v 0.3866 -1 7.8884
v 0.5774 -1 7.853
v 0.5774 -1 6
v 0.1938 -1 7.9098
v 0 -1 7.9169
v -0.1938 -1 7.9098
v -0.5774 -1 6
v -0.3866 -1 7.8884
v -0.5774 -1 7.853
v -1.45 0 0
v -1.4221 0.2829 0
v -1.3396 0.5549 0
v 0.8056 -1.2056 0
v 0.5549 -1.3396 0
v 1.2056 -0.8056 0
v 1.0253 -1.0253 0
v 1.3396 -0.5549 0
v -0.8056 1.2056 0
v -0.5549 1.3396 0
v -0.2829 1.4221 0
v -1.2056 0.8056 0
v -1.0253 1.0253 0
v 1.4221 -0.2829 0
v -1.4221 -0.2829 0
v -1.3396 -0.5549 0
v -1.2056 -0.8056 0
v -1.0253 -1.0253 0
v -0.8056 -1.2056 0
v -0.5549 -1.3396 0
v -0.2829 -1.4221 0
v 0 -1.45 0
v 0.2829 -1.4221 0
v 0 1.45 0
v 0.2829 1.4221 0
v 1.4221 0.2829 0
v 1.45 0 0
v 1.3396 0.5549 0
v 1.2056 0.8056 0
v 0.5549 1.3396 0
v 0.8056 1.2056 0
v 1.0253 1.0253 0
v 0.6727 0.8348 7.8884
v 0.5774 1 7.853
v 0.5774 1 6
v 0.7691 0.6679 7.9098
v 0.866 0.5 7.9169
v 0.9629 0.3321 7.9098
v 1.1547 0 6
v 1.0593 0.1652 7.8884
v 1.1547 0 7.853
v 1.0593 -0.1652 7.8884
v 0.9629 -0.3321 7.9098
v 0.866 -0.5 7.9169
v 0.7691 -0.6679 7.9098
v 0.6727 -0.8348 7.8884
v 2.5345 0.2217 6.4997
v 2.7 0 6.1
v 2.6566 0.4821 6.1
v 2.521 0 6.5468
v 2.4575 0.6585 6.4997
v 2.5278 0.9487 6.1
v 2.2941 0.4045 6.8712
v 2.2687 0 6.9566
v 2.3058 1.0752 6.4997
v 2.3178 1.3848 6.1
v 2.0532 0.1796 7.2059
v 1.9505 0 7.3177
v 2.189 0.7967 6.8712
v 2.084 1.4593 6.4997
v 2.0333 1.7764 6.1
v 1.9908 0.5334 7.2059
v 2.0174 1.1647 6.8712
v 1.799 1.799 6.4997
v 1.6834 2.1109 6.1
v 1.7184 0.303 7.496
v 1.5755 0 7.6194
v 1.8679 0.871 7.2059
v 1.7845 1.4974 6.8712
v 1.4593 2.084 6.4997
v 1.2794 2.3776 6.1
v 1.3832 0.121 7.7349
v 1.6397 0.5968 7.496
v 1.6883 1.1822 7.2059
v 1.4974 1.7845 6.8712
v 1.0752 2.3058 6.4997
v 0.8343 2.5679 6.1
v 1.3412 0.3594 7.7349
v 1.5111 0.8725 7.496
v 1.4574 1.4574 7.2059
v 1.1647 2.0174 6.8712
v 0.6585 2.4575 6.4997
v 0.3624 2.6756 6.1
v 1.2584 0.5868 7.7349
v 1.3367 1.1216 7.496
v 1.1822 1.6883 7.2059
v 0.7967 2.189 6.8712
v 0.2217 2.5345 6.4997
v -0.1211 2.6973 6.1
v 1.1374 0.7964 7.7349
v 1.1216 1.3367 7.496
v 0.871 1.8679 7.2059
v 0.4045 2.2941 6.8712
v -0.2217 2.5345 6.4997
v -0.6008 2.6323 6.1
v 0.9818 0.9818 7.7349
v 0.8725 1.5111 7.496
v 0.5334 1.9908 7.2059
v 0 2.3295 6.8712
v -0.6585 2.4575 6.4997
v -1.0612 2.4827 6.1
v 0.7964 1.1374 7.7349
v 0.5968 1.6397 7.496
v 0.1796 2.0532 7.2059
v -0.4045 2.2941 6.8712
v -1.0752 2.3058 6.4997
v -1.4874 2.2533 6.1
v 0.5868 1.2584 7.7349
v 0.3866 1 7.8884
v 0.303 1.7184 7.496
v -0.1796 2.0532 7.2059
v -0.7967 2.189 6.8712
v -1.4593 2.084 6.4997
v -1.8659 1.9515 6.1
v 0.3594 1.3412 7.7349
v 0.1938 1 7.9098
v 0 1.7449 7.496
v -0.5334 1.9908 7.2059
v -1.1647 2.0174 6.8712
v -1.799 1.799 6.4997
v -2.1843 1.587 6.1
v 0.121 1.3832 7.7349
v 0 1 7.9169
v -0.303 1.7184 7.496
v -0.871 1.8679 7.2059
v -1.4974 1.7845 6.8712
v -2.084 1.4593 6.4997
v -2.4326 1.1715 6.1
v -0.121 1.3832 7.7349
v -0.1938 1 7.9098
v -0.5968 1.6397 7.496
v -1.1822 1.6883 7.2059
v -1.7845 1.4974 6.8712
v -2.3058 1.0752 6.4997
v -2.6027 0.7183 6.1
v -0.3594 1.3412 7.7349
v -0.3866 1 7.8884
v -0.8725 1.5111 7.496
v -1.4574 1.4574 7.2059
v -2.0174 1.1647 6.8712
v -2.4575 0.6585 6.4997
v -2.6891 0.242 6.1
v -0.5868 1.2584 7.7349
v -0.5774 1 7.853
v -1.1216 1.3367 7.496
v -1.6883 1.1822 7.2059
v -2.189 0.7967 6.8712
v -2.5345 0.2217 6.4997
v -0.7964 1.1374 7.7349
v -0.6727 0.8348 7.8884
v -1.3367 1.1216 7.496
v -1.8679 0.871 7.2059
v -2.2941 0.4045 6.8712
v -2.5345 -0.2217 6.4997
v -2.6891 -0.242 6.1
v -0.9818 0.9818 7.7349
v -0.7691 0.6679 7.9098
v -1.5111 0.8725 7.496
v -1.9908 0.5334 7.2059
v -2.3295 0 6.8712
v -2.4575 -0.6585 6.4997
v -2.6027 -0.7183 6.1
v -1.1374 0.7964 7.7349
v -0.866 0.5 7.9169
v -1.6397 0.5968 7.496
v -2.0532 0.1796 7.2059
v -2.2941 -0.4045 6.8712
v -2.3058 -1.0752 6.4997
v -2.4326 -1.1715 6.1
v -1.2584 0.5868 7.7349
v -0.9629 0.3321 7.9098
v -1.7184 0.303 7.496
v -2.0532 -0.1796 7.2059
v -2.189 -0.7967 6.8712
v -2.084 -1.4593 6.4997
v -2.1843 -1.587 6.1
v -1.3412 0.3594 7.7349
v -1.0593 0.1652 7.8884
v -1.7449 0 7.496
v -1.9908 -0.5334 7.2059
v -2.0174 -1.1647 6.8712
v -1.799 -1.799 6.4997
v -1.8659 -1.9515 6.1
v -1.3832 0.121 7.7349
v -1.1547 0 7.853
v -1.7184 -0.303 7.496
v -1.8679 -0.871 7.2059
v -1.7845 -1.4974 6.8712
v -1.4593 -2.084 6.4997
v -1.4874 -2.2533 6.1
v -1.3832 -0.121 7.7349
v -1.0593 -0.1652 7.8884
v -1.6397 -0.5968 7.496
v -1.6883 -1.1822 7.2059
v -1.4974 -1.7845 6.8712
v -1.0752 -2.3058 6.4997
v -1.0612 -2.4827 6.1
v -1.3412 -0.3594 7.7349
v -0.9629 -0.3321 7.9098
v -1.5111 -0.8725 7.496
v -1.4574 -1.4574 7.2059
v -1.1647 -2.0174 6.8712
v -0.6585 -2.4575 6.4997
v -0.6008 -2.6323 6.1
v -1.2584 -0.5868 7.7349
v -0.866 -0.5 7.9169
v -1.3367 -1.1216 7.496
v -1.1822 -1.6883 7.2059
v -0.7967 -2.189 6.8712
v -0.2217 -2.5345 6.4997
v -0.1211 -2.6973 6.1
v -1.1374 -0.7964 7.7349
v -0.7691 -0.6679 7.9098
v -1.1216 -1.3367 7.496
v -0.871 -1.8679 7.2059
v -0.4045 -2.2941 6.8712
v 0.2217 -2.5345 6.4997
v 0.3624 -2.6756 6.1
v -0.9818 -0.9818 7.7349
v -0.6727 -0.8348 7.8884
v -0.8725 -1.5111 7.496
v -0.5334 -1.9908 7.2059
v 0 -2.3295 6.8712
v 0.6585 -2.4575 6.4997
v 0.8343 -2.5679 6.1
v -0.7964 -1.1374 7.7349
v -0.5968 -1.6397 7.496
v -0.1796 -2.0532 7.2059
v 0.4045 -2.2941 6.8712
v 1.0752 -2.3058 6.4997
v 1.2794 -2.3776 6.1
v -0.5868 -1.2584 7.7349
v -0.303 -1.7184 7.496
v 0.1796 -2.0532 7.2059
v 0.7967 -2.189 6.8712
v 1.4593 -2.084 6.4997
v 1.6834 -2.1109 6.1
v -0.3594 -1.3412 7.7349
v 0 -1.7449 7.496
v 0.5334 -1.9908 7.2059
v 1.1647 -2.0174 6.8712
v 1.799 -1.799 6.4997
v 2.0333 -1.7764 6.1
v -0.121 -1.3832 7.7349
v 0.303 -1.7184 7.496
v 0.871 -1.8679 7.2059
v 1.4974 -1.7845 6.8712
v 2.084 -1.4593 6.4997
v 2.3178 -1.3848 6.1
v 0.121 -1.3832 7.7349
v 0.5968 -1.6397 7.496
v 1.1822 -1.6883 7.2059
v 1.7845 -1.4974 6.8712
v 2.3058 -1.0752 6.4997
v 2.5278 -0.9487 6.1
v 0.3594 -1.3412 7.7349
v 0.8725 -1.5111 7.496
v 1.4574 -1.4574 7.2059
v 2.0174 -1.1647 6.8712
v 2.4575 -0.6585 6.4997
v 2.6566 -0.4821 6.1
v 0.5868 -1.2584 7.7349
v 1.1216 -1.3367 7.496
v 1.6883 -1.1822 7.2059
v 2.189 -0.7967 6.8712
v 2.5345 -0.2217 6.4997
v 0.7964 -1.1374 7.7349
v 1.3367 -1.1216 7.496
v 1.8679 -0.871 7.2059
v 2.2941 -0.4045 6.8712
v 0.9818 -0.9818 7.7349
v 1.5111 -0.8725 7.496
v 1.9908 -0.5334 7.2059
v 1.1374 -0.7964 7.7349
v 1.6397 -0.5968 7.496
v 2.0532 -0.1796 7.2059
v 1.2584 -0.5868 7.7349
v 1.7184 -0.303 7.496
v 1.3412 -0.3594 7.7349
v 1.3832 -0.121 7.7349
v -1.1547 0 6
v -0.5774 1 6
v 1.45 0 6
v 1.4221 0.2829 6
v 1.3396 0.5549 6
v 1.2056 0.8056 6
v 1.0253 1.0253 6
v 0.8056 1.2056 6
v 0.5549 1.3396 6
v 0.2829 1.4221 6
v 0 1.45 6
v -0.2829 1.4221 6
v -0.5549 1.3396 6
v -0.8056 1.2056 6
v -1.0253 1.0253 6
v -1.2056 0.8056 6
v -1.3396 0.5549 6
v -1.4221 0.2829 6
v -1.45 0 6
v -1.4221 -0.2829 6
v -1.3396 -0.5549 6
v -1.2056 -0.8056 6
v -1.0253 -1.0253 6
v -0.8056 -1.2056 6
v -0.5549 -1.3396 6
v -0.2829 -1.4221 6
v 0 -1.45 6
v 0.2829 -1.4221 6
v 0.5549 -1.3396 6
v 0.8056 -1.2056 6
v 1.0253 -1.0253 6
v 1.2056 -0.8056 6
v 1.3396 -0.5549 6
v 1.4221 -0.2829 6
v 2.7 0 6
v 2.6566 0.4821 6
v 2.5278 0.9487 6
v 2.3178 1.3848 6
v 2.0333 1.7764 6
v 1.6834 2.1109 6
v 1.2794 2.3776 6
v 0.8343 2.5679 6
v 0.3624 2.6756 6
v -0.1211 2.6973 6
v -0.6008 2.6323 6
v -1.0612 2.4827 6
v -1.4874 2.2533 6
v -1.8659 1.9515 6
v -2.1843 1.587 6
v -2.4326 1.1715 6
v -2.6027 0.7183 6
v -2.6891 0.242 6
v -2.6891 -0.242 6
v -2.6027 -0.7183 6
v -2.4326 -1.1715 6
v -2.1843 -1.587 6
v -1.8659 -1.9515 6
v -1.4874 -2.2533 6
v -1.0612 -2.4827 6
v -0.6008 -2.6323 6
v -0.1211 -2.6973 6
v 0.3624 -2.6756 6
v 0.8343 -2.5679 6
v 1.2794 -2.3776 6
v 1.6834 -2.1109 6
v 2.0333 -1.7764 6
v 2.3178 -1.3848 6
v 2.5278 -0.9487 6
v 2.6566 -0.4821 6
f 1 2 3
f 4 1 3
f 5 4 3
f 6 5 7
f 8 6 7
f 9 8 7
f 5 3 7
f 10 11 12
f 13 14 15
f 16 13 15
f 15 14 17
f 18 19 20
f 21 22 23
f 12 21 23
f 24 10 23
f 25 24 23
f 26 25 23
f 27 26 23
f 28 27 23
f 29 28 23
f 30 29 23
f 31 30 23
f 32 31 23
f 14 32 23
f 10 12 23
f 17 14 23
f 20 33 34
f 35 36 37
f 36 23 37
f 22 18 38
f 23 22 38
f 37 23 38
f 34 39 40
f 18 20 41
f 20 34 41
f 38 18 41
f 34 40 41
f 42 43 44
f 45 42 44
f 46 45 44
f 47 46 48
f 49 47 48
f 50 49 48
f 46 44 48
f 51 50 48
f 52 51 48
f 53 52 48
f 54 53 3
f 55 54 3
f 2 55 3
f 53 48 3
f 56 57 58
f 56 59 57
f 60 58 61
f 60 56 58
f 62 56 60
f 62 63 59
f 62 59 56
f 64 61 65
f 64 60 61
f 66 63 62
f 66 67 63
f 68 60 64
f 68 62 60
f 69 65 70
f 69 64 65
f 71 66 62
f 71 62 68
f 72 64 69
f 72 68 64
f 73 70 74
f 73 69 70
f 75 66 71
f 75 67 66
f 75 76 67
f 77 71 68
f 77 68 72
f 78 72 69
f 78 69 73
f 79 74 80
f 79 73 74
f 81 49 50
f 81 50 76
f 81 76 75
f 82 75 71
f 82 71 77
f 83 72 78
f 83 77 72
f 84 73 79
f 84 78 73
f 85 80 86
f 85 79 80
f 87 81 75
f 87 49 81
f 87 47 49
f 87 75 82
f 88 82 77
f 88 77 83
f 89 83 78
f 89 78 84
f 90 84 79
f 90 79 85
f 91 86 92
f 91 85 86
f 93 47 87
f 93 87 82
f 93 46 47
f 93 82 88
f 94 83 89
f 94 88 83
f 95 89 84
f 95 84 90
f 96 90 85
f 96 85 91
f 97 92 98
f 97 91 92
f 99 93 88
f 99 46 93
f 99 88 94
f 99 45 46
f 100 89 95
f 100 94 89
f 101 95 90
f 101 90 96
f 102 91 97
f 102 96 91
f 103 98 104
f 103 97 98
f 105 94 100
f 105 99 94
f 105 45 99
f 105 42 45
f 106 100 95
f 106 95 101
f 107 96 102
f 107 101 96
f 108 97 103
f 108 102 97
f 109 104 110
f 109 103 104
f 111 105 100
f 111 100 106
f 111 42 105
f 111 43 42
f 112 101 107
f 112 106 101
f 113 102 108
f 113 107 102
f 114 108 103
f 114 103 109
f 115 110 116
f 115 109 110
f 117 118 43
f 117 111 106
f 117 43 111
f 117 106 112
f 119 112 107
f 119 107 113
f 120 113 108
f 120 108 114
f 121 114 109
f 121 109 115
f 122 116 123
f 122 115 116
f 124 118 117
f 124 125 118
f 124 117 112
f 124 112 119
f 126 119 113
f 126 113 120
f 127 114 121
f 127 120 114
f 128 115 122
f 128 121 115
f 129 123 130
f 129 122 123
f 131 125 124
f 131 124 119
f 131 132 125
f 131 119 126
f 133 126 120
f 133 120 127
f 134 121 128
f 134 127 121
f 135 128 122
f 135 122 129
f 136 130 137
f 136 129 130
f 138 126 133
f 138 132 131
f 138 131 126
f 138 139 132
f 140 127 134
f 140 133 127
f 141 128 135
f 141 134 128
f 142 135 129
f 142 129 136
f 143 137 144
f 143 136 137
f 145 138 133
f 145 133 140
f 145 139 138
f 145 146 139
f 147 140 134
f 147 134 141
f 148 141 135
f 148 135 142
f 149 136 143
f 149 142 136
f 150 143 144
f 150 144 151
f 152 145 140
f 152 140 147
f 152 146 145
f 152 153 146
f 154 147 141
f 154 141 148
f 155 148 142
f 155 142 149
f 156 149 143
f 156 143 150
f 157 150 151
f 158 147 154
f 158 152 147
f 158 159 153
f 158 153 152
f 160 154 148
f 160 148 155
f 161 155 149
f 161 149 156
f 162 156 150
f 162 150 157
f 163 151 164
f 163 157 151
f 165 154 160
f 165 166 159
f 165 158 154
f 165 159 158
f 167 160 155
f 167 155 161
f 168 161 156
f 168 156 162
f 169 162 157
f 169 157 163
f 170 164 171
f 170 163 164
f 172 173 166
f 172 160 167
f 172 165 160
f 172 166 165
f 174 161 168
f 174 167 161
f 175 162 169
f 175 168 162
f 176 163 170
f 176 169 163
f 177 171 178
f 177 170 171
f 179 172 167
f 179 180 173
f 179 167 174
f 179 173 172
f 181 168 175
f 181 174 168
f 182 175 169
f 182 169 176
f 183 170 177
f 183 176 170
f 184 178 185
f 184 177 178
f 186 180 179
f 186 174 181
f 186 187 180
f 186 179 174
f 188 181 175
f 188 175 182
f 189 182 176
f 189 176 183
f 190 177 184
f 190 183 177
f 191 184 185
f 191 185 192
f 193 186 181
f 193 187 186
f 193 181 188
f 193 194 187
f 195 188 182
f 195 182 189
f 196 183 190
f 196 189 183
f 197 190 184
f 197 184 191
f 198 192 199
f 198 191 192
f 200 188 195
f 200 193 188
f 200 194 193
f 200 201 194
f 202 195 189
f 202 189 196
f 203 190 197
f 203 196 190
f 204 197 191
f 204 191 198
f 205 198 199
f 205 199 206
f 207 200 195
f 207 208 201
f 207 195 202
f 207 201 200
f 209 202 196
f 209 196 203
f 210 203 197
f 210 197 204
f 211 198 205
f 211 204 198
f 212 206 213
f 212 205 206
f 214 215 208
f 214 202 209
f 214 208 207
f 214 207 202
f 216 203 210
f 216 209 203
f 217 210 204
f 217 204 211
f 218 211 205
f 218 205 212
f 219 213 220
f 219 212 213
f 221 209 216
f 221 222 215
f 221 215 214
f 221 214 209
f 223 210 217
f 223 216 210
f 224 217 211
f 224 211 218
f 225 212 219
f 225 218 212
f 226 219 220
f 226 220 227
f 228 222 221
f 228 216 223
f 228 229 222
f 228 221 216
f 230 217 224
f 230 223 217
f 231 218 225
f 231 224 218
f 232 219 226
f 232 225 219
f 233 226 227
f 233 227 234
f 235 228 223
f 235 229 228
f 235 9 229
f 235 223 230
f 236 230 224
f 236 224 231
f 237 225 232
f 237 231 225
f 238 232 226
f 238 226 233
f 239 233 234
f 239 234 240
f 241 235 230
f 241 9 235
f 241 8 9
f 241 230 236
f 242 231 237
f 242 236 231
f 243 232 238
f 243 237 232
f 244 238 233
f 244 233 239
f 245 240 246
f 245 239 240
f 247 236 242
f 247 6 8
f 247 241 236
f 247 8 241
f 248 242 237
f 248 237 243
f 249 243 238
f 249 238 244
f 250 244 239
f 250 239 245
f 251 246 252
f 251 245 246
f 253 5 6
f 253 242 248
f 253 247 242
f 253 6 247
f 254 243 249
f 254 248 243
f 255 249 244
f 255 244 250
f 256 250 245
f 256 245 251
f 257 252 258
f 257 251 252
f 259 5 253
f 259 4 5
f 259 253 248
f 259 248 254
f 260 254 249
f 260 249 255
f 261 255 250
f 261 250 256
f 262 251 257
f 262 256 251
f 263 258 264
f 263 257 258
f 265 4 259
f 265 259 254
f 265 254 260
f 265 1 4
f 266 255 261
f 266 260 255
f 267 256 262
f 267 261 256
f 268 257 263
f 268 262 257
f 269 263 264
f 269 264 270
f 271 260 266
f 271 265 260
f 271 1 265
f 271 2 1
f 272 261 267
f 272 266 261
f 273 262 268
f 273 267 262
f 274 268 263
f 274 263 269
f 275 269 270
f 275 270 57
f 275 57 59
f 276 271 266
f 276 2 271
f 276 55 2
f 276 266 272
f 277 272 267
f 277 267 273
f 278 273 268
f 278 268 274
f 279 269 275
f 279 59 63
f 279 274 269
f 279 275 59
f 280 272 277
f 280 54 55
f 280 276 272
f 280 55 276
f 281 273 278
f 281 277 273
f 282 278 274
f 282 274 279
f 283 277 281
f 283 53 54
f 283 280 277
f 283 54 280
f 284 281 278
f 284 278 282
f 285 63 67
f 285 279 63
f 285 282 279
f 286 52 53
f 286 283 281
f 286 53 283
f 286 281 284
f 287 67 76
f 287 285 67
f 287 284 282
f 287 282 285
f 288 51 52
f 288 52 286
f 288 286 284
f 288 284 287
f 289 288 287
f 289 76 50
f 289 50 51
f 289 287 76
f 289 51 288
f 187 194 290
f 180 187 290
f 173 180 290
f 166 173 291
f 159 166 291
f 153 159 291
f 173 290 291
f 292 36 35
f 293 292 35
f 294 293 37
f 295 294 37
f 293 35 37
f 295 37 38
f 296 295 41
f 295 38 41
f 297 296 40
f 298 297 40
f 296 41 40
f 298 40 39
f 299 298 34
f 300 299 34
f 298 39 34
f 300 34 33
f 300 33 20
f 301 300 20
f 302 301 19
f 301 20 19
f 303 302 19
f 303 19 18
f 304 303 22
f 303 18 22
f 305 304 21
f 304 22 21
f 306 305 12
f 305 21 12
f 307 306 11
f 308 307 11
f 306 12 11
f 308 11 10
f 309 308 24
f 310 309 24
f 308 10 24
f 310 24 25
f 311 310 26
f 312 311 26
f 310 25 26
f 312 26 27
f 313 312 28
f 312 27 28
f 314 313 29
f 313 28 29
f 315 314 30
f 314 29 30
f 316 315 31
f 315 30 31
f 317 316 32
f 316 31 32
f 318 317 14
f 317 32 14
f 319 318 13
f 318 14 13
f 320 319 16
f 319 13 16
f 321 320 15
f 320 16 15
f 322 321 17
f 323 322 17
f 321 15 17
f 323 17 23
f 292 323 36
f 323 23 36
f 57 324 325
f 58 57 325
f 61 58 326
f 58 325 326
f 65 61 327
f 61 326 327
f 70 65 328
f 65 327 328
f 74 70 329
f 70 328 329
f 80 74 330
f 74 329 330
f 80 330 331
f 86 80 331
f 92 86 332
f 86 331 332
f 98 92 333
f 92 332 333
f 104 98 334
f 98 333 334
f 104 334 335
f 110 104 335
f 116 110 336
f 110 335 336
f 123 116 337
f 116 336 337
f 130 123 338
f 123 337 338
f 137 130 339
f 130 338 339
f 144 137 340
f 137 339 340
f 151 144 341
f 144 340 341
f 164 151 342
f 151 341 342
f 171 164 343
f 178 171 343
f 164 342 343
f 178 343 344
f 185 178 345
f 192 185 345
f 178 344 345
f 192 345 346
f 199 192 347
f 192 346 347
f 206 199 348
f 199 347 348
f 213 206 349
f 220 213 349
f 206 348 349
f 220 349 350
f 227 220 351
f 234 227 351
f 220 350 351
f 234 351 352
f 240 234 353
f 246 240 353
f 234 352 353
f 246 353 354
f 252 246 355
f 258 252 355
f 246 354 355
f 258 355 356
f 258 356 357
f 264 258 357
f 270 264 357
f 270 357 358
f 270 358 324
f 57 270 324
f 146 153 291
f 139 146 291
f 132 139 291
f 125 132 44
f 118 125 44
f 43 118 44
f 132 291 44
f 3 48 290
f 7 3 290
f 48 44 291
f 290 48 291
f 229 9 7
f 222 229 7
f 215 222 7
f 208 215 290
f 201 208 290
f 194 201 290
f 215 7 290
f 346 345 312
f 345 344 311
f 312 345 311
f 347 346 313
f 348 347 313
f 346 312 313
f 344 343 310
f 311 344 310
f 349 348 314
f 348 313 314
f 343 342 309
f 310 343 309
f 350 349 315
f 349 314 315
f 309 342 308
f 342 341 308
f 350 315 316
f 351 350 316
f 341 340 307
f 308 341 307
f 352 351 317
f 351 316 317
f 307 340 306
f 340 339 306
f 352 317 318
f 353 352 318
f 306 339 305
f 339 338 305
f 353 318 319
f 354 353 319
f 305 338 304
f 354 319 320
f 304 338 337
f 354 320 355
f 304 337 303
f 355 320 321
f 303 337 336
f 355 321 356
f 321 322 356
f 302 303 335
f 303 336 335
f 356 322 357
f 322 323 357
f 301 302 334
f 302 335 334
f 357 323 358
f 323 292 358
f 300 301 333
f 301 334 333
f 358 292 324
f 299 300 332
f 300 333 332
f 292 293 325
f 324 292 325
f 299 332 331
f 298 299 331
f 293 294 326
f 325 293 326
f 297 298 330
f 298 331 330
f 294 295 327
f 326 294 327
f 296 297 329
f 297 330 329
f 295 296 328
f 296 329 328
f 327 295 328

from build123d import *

# Parameters (mm, degrees)
SKETCH1_R           = 1.45
BOSS_EXTRUDE1_DEPTH = 6
SKETCH2_R           = 2.7
BOSS_EXTRUDE2_DEPTH = 0.1
DOME1_FACE_RADIUS   = 2.7
DOME1_HEIGHT        = 2
CUT_EXTRUDE1_DEPTH  = 3.1


with BuildPart() as part:
    # Sketch1 → Boss-Extrude1 (new body)
    with BuildSketch(Plane.XY):
        Circle(SKETCH1_R)
    extrude(amount=BOSS_EXTRUDE1_DEPTH)

    # Sketch2 → Boss-Extrude2 (add)
    with BuildSketch(Plane.XY.offset(6)):
        Circle(SKETCH2_R)
    extrude(amount=BOSS_EXTRUDE2_DEPTH)

    # Dome1: a dome of height H over a round flat face of radius A is a cap of a sphere of radius (A * A + H * H) / (2 * H)
    dome1_r = (DOME1_FACE_RADIUS * DOME1_FACE_RADIUS + DOME1_HEIGHT * DOME1_HEIGHT) / (2 * DOME1_HEIGHT)
    dome1_base = Plane((0, 0, 6.1), z_dir=(0, 0, 1))
    with Locations(dome1_base.offset(DOME1_HEIGHT - dome1_r)):
        dome1_ball = Sphere(dome1_r, mode=Mode.PRIVATE)
    add(split(dome1_ball, bisect_by=dome1_base, keep=Keep.TOP, mode=Mode.PRIVATE))

    # Sketch3 → Cut-Extrude1 (cut, through all)
    with BuildSketch(Plane(origin=(0, 0, 6), x_dir=(-1, 0, 0), z_dir=(0, 0, -1))):
        Polygon((-0.577350269, 1), (-1.154700538, 0), (-0.577350269, -1), (0.577350269, -1), (1.154700538, 0), (0.577350269, 1), align=None)
    extrude(amount=-CUT_EXTRUDE1_DEPTH, mode=Mode.SUBTRACT)


solid = part.part
